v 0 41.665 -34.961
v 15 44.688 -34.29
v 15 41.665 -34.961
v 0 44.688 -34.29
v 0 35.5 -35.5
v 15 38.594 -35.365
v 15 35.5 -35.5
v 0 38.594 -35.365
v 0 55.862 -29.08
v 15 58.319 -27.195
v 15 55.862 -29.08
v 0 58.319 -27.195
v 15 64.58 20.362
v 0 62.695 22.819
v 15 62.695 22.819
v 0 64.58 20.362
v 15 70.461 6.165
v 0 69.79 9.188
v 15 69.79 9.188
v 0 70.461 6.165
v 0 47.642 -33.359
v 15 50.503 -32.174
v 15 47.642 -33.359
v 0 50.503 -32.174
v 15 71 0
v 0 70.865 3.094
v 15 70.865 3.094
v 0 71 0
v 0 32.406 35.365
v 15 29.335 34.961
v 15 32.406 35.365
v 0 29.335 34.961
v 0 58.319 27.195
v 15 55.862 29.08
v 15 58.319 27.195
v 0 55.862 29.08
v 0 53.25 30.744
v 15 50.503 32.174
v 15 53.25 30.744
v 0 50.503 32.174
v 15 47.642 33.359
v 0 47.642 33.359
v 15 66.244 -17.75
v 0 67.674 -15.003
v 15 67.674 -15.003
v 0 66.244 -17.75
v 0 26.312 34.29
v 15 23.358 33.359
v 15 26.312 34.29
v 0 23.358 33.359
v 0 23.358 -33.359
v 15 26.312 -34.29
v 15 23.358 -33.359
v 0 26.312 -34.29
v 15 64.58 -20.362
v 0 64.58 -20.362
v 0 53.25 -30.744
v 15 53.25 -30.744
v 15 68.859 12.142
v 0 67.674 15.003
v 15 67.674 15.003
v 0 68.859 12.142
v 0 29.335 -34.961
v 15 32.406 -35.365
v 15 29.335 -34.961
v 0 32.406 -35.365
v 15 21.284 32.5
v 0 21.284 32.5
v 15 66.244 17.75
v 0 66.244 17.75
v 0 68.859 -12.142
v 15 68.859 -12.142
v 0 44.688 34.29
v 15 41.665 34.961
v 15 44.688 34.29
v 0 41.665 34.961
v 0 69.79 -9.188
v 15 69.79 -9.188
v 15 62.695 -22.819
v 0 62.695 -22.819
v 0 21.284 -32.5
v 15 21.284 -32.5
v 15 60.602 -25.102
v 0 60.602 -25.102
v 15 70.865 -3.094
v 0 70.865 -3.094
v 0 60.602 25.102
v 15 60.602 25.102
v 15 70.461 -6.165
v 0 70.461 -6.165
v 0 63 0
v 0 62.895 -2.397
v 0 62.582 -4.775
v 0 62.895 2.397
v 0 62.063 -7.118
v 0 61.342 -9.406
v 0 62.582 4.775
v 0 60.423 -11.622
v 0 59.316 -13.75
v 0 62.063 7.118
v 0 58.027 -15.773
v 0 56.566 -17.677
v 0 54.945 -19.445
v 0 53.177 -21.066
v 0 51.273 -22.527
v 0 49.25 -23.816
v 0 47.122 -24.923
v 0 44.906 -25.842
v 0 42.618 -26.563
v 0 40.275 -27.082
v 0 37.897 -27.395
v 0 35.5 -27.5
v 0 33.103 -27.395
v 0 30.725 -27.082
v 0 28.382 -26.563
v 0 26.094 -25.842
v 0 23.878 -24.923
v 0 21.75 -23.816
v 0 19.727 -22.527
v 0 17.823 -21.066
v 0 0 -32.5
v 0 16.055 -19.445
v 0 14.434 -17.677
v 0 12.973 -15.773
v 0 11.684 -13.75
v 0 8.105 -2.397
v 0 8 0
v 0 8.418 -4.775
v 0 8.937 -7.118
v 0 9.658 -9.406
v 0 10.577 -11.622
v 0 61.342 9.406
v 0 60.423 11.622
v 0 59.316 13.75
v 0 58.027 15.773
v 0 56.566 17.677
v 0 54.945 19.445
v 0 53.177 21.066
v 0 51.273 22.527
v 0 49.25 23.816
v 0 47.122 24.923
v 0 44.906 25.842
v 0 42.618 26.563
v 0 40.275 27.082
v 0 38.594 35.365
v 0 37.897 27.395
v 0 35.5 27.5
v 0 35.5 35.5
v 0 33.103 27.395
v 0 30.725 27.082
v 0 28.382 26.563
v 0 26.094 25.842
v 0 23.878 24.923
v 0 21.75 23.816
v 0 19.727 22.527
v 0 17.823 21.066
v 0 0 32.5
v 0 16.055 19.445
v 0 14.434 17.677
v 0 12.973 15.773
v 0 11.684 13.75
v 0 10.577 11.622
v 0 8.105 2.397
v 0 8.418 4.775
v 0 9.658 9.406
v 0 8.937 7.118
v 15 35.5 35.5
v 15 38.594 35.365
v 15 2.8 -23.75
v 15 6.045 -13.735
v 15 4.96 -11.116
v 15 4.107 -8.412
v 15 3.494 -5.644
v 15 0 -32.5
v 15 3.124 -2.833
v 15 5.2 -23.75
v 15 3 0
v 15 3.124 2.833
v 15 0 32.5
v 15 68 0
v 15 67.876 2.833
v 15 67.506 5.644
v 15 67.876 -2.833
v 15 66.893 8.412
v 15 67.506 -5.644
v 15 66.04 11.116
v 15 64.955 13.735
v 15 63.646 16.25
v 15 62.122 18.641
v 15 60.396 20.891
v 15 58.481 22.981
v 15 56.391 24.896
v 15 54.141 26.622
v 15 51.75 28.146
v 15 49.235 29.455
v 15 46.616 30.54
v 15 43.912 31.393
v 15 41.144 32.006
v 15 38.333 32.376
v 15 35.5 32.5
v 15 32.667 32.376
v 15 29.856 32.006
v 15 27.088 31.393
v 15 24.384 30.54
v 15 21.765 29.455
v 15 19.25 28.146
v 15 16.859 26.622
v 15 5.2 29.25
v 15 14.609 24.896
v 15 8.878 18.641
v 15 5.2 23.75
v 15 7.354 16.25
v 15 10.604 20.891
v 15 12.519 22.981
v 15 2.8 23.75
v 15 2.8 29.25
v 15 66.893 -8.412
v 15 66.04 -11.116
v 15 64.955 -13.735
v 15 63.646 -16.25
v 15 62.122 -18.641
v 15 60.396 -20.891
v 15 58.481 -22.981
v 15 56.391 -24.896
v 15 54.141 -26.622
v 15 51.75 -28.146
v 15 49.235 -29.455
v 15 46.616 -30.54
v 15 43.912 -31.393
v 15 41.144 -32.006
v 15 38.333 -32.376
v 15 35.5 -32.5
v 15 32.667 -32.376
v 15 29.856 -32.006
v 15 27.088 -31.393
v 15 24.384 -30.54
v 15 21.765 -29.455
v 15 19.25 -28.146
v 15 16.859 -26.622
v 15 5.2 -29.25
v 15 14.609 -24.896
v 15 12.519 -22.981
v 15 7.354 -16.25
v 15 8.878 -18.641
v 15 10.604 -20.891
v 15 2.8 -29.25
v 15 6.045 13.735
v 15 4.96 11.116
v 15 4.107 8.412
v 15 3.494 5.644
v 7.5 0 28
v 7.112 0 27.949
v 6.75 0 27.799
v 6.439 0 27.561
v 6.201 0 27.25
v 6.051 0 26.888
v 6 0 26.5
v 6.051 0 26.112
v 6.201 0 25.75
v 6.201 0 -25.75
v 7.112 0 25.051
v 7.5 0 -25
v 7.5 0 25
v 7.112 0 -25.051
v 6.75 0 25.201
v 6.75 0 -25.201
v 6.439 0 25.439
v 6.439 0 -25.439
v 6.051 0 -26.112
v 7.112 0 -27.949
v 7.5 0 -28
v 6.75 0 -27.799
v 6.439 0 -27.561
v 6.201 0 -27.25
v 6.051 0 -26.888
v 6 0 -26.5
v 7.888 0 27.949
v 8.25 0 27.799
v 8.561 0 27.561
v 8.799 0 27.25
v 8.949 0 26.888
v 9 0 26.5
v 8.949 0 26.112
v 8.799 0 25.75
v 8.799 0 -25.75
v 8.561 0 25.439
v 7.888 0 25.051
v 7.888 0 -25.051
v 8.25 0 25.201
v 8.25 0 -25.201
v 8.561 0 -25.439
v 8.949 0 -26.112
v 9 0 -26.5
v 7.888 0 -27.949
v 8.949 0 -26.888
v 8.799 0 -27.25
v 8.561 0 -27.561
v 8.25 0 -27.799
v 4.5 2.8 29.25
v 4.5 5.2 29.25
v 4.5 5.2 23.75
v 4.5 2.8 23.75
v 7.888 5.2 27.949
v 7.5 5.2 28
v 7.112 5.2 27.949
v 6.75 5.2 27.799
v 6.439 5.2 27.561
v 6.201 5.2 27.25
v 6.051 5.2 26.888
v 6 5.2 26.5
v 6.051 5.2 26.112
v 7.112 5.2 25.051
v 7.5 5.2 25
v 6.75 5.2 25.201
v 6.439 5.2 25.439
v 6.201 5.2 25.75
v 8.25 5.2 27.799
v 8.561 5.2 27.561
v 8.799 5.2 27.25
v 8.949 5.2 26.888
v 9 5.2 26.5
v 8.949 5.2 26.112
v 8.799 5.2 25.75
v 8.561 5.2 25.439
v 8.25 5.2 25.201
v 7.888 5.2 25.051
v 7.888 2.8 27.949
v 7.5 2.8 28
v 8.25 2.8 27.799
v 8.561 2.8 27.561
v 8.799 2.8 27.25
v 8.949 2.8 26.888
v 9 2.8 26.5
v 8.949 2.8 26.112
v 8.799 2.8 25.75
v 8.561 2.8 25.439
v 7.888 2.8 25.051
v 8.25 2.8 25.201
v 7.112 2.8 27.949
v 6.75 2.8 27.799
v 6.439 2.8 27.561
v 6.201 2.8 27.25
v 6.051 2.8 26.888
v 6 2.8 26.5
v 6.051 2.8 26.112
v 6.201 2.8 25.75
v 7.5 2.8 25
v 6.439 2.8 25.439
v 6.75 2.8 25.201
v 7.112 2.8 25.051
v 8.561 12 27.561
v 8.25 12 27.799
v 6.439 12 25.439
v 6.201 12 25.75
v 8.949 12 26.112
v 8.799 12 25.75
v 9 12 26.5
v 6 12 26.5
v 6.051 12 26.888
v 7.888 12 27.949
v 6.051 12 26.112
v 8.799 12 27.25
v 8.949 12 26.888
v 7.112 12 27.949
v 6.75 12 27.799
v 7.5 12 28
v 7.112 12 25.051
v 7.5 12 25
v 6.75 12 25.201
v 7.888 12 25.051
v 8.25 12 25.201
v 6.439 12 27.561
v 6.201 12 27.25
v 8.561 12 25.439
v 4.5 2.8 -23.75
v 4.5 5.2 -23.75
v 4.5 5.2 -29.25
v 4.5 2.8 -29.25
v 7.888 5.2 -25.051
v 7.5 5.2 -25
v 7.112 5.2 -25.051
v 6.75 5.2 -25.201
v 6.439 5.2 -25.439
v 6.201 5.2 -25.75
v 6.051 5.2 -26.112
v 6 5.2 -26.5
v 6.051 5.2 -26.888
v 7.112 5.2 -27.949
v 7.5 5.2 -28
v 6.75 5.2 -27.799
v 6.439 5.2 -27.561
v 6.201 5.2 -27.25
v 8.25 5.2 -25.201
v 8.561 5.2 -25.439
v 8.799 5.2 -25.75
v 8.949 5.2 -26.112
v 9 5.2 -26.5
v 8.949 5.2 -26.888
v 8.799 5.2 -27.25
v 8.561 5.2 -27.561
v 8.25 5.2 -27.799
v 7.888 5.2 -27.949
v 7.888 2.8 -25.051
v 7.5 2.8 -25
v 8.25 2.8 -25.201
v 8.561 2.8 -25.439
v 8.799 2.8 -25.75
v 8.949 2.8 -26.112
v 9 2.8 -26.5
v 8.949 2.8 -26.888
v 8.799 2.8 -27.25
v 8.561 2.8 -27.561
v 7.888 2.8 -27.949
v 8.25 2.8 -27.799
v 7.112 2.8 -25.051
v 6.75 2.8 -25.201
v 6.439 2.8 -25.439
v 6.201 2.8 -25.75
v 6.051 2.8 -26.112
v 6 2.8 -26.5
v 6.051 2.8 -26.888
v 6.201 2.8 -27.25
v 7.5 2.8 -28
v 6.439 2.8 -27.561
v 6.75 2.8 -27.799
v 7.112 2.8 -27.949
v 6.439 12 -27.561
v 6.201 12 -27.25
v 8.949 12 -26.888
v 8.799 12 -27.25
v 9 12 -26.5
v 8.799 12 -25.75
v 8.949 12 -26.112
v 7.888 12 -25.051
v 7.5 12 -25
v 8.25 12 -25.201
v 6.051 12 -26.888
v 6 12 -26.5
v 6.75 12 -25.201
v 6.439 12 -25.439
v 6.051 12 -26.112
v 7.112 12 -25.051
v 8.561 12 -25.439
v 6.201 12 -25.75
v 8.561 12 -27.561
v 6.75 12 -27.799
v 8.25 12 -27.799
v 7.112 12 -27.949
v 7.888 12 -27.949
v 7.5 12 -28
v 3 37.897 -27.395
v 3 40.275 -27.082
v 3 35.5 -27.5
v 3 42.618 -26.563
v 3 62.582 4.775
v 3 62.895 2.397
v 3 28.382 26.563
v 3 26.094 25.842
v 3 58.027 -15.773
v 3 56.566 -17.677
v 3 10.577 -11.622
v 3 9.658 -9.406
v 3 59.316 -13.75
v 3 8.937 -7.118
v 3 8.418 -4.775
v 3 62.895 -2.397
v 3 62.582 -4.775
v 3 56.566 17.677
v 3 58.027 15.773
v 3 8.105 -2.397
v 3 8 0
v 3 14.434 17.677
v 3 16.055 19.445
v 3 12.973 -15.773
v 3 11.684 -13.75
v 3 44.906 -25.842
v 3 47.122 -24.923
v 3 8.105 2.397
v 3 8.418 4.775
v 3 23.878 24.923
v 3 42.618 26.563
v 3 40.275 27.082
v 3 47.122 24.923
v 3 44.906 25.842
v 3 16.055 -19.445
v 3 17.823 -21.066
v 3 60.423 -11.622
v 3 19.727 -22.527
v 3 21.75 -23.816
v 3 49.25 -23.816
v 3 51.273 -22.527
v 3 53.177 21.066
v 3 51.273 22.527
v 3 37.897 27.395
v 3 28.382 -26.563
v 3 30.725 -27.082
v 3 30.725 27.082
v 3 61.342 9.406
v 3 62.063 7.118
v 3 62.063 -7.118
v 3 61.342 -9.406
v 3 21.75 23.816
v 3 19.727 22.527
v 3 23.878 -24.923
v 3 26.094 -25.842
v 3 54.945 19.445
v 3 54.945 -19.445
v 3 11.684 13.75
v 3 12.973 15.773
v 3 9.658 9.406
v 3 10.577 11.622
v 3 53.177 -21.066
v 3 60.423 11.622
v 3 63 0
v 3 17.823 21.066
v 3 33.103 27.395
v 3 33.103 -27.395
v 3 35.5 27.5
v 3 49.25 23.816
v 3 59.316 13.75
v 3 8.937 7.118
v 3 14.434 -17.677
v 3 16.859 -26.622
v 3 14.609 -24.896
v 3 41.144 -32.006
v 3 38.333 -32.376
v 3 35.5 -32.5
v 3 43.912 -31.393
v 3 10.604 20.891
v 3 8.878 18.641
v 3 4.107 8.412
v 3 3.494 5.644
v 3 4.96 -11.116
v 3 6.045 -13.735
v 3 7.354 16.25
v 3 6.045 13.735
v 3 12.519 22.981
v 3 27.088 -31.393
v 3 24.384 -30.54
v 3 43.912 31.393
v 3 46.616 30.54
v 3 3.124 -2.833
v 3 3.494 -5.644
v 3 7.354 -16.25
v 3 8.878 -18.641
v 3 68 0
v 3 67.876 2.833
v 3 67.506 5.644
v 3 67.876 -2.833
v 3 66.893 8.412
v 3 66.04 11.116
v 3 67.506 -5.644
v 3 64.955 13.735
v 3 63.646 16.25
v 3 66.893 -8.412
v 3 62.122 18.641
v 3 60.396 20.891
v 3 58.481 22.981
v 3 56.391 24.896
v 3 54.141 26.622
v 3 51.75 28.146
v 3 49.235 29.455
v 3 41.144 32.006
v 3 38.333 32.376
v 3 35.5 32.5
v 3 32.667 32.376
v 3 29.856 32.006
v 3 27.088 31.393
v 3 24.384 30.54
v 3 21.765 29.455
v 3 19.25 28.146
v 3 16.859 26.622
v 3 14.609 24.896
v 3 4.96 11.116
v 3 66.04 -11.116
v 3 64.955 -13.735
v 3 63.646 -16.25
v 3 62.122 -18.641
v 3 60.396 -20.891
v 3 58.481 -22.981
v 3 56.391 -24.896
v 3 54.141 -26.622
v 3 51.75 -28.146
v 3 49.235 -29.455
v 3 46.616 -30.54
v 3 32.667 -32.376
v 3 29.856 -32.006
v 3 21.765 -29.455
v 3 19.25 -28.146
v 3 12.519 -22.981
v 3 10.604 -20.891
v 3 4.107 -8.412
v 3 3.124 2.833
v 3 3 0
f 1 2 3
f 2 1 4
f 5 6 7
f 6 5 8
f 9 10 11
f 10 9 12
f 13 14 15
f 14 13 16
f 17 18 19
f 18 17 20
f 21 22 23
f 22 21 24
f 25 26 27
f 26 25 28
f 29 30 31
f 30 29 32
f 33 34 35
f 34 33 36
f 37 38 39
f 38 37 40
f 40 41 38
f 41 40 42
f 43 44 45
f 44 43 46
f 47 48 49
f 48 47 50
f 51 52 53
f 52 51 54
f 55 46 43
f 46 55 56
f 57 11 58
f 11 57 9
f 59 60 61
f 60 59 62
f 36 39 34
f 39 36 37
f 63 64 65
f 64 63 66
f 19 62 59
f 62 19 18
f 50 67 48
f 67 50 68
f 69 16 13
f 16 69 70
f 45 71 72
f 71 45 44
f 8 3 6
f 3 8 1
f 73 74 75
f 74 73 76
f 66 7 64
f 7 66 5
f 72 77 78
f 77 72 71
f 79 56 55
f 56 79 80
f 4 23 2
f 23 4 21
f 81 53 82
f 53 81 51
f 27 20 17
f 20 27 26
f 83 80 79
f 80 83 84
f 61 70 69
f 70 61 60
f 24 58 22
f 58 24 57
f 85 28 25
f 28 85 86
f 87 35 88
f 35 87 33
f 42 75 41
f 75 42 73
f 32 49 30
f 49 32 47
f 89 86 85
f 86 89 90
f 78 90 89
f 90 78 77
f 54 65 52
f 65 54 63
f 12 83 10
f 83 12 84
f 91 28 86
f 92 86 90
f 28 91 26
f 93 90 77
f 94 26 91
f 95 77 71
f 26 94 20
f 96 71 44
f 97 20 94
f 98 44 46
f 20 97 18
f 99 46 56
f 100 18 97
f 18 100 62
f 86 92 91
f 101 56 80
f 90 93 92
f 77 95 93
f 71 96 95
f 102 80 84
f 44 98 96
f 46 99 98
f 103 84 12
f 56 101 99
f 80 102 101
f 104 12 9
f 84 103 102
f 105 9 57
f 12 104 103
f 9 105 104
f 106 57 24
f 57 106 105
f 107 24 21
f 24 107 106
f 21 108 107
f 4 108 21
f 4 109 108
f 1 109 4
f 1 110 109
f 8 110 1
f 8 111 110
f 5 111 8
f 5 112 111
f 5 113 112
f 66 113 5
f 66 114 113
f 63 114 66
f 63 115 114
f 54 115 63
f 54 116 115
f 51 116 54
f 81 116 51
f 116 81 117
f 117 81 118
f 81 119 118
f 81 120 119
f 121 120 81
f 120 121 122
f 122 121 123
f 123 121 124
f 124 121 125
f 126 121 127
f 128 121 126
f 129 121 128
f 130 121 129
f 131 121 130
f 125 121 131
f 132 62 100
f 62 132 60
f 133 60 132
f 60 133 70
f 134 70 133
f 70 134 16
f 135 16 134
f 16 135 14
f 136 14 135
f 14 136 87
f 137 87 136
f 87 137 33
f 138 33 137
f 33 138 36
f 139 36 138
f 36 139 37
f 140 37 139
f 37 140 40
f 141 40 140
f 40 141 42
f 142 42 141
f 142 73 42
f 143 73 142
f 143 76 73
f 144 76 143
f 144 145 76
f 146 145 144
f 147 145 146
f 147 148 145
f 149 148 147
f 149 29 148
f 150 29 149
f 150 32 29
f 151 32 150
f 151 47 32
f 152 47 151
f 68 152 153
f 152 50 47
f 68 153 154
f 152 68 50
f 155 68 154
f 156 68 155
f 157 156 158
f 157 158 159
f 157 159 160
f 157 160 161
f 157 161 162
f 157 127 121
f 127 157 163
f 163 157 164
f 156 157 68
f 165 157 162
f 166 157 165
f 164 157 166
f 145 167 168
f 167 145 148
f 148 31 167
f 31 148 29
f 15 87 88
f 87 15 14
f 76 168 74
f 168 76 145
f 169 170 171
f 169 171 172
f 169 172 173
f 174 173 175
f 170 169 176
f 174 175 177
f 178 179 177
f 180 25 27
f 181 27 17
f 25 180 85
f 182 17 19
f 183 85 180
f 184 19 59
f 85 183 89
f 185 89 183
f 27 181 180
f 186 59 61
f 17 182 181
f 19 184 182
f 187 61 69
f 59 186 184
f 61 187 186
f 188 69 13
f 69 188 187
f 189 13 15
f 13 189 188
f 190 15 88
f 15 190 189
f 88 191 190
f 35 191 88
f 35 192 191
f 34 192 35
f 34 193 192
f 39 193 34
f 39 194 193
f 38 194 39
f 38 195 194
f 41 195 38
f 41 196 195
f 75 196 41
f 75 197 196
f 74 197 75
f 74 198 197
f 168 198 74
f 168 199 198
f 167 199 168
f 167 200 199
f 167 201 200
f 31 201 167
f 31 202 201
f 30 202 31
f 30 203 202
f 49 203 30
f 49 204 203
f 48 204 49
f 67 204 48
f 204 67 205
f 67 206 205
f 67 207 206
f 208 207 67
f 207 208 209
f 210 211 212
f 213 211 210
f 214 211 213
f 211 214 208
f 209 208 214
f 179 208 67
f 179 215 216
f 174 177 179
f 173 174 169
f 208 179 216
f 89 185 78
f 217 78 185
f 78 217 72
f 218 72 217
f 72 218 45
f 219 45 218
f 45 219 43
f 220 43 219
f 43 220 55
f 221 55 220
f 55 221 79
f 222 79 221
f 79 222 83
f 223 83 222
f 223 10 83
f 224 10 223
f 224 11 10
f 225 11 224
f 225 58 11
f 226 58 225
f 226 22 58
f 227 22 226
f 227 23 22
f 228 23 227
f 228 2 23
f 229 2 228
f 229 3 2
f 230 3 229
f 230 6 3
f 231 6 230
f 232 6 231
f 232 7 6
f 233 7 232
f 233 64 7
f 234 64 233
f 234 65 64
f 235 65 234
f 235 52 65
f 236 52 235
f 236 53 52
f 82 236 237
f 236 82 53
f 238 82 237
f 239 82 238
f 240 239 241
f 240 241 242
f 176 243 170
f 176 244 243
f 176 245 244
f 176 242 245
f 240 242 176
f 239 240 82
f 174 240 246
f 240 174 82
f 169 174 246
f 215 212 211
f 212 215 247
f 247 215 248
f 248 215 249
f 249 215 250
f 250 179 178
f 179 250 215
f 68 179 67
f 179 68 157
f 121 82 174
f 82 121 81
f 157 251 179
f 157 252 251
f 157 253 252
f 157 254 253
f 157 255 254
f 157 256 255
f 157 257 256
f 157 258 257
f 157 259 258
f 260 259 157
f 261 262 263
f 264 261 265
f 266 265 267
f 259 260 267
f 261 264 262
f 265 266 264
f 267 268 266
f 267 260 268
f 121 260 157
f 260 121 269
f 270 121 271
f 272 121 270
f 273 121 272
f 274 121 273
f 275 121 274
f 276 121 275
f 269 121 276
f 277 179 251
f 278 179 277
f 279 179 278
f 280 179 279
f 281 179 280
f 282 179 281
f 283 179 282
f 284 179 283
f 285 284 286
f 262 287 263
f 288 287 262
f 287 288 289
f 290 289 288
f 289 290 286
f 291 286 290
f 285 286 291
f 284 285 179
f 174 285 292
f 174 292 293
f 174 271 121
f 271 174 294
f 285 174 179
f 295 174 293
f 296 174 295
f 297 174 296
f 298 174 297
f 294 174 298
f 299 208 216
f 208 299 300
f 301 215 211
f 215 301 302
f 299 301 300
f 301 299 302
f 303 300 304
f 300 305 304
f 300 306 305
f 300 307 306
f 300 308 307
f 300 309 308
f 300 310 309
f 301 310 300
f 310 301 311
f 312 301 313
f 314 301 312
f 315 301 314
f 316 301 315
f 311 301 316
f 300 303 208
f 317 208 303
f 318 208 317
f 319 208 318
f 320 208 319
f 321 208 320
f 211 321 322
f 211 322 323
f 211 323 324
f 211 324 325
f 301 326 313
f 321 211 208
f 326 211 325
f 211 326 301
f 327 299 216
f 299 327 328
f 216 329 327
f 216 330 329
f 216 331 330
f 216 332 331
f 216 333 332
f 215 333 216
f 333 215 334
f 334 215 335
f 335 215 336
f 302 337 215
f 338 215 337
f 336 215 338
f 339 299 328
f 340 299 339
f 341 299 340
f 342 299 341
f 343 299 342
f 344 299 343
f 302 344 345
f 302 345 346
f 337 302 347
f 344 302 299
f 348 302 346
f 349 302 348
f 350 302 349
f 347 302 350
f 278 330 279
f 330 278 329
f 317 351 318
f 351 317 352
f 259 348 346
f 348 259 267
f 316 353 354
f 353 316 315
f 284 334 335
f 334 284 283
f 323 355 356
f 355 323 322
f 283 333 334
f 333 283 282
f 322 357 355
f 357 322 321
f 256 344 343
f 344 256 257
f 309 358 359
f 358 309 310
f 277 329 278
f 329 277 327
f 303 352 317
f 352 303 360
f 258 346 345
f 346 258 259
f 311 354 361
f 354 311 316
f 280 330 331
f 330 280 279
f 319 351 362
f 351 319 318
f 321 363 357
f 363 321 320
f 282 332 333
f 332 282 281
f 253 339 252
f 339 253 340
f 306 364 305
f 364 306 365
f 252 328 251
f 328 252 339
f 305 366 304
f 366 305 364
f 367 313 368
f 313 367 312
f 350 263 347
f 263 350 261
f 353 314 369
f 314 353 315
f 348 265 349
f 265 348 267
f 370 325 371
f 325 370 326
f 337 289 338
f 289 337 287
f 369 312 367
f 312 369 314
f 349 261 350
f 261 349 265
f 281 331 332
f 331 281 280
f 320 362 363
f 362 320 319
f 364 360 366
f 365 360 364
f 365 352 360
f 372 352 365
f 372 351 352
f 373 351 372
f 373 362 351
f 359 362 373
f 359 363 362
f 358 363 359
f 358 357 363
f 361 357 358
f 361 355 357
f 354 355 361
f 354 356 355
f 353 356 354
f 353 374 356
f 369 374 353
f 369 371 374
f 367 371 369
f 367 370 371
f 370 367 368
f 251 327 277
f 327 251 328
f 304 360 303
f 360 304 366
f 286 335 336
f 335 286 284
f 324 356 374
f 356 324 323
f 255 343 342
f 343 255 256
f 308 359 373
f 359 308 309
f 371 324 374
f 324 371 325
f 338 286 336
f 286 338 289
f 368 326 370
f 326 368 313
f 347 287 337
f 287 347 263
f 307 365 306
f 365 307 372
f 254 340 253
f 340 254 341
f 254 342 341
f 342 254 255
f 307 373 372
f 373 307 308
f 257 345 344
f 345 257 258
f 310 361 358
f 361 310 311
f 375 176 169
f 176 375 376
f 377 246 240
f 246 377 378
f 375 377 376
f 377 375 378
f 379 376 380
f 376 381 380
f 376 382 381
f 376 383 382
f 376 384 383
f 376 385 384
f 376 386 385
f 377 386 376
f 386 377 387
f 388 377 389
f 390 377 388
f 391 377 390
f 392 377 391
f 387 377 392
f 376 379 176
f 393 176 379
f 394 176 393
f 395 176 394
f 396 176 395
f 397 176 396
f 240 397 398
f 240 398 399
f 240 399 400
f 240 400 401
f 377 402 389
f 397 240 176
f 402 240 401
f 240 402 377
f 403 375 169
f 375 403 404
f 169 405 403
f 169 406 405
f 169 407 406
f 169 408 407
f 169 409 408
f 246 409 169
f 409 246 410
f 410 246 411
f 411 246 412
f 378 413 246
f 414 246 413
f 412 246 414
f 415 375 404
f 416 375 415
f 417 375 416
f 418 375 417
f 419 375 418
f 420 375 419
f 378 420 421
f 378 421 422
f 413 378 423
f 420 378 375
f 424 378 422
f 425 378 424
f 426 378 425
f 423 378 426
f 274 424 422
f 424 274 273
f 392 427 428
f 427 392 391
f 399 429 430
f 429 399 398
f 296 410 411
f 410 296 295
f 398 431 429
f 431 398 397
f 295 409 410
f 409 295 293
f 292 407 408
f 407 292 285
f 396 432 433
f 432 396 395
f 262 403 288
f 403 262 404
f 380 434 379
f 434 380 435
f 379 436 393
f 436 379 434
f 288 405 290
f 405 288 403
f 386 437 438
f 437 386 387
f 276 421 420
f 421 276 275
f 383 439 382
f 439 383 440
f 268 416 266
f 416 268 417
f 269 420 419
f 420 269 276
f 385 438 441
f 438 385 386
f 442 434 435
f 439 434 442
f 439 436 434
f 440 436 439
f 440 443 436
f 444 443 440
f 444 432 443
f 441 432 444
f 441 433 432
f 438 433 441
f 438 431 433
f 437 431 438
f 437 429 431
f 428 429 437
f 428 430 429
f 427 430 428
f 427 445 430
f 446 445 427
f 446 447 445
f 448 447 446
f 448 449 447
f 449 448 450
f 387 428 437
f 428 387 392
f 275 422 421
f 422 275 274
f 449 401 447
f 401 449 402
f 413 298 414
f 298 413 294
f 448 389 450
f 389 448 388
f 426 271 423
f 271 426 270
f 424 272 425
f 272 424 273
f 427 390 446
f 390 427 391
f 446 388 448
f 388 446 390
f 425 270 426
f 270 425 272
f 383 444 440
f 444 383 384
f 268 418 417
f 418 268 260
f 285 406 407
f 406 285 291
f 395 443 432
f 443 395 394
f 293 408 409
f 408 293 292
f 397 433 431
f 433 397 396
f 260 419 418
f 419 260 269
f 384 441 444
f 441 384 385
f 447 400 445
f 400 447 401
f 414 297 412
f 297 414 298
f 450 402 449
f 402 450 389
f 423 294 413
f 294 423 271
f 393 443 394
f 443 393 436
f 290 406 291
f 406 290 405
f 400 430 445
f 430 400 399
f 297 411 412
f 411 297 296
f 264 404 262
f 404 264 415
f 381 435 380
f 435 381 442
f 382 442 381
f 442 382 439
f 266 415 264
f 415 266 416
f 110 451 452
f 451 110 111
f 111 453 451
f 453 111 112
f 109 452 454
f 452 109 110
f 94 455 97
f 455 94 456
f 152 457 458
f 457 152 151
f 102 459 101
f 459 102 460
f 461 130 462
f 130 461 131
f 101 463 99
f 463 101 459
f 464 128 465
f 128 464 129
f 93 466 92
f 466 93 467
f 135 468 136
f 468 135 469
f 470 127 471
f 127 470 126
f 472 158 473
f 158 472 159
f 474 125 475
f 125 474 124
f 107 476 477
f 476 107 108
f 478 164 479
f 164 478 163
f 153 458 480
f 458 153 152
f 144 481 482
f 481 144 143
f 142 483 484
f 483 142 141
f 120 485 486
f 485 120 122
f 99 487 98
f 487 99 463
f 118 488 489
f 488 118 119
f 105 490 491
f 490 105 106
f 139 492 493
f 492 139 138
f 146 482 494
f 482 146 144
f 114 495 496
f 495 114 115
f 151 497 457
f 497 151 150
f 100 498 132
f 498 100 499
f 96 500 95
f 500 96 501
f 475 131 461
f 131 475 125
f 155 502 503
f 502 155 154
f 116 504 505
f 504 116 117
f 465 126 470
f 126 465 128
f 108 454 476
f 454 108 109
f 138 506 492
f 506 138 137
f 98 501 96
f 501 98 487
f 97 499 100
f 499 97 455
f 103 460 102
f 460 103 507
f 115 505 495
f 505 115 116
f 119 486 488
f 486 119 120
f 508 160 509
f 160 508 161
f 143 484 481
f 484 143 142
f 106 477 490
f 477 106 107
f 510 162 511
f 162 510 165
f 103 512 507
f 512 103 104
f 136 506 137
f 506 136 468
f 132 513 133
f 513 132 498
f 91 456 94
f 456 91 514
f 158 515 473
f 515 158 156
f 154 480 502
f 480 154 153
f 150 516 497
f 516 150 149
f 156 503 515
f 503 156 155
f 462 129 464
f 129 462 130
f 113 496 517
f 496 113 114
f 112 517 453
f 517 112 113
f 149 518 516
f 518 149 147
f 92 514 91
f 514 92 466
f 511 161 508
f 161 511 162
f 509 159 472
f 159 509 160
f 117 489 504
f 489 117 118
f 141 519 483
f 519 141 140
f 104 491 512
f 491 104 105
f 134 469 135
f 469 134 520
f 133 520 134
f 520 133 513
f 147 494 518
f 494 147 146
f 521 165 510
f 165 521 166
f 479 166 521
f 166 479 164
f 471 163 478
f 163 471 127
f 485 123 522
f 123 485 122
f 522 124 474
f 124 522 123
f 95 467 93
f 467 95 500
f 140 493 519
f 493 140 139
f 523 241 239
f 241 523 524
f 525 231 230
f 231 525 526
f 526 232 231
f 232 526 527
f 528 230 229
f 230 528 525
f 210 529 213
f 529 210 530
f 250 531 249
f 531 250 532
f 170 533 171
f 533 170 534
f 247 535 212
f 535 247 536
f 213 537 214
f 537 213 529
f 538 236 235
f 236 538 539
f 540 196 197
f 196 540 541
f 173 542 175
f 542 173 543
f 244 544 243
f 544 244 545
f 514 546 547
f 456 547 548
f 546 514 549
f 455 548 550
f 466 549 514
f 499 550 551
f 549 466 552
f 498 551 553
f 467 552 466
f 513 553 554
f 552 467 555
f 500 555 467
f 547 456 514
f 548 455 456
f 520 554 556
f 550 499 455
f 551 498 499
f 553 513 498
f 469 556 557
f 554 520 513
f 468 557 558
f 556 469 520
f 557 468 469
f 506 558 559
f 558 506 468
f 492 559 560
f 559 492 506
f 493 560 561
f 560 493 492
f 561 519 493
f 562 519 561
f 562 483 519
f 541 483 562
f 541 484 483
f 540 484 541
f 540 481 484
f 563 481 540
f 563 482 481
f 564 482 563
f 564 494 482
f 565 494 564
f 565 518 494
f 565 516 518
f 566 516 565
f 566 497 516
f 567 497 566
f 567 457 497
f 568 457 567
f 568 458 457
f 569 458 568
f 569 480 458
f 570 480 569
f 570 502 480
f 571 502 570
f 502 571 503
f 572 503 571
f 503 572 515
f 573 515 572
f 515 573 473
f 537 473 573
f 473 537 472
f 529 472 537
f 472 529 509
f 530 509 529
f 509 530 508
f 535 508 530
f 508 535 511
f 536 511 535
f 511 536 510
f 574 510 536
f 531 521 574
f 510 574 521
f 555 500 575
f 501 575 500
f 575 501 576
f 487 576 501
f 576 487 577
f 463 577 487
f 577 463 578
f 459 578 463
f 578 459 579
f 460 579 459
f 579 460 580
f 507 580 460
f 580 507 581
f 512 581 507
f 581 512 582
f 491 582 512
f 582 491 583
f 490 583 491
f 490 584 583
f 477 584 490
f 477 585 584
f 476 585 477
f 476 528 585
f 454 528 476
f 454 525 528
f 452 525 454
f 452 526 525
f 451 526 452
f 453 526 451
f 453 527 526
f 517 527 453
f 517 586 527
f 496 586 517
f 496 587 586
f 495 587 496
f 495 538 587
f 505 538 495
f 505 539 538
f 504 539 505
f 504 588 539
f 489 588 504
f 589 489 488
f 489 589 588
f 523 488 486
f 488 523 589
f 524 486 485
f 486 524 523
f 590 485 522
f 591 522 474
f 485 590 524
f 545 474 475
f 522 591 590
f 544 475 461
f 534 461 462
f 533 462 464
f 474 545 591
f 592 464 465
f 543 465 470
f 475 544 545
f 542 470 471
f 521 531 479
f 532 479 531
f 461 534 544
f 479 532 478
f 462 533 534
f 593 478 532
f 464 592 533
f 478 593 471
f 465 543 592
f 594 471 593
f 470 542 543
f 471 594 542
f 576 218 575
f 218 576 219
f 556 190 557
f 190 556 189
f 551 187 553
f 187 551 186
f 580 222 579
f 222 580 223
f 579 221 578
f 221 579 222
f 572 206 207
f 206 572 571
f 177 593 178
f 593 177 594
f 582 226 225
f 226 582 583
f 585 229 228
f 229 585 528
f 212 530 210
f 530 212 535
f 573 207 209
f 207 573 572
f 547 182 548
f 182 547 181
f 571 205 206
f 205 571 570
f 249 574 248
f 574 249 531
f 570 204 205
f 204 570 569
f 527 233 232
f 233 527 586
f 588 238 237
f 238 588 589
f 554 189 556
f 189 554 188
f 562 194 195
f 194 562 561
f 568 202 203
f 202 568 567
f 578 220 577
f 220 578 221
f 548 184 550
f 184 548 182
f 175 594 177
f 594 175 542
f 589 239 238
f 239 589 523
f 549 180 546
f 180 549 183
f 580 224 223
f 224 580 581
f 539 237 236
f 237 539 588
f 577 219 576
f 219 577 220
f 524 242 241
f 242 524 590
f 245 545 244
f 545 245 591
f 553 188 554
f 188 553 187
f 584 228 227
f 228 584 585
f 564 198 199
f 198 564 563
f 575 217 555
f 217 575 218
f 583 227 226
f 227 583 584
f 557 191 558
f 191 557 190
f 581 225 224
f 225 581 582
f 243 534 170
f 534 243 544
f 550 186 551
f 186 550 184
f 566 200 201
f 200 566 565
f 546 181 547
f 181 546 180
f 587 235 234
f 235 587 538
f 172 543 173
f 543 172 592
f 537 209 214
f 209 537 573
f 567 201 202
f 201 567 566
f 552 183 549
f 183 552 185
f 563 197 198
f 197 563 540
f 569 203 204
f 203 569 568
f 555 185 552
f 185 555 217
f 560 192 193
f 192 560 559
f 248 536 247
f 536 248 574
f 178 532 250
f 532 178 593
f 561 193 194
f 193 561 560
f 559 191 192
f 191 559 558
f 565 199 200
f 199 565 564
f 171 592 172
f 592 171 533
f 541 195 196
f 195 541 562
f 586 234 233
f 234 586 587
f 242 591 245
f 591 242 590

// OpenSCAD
$fa = 5;
$fs = 0.4;

ring_t = 3;
cap_dia = 65;

module mount(x) {
    translate([15/2-6/2, 4-2.4/2, x-5.5/2]) cube([15, 2.4, 5.5]);
    translate([15/2, 0, x]) rotate([-90, 0, 0]) cylinder(12, d=3);
}

difference() {
    union() {
        translate([0, cap_dia/2+ring_t, 0]) rotate([0, 90, 0]) cylinder(15, d=cap_dia+ring_t*2);
        translate([0, 0, -cap_dia/2]) cube([15, cap_dia/2, cap_dia]);
    }
    mount(cap_dia/2-6);
    mount(-cap_dia/2+6);
    translate([0, cap_dia/2+ring_t, 0]) rotate([0, 90, 0]) {
        cylinder(30, d=cap_dia-10);
        translate([0, 0, 3]) cylinder(130, d=cap_dia);
    }
}   
